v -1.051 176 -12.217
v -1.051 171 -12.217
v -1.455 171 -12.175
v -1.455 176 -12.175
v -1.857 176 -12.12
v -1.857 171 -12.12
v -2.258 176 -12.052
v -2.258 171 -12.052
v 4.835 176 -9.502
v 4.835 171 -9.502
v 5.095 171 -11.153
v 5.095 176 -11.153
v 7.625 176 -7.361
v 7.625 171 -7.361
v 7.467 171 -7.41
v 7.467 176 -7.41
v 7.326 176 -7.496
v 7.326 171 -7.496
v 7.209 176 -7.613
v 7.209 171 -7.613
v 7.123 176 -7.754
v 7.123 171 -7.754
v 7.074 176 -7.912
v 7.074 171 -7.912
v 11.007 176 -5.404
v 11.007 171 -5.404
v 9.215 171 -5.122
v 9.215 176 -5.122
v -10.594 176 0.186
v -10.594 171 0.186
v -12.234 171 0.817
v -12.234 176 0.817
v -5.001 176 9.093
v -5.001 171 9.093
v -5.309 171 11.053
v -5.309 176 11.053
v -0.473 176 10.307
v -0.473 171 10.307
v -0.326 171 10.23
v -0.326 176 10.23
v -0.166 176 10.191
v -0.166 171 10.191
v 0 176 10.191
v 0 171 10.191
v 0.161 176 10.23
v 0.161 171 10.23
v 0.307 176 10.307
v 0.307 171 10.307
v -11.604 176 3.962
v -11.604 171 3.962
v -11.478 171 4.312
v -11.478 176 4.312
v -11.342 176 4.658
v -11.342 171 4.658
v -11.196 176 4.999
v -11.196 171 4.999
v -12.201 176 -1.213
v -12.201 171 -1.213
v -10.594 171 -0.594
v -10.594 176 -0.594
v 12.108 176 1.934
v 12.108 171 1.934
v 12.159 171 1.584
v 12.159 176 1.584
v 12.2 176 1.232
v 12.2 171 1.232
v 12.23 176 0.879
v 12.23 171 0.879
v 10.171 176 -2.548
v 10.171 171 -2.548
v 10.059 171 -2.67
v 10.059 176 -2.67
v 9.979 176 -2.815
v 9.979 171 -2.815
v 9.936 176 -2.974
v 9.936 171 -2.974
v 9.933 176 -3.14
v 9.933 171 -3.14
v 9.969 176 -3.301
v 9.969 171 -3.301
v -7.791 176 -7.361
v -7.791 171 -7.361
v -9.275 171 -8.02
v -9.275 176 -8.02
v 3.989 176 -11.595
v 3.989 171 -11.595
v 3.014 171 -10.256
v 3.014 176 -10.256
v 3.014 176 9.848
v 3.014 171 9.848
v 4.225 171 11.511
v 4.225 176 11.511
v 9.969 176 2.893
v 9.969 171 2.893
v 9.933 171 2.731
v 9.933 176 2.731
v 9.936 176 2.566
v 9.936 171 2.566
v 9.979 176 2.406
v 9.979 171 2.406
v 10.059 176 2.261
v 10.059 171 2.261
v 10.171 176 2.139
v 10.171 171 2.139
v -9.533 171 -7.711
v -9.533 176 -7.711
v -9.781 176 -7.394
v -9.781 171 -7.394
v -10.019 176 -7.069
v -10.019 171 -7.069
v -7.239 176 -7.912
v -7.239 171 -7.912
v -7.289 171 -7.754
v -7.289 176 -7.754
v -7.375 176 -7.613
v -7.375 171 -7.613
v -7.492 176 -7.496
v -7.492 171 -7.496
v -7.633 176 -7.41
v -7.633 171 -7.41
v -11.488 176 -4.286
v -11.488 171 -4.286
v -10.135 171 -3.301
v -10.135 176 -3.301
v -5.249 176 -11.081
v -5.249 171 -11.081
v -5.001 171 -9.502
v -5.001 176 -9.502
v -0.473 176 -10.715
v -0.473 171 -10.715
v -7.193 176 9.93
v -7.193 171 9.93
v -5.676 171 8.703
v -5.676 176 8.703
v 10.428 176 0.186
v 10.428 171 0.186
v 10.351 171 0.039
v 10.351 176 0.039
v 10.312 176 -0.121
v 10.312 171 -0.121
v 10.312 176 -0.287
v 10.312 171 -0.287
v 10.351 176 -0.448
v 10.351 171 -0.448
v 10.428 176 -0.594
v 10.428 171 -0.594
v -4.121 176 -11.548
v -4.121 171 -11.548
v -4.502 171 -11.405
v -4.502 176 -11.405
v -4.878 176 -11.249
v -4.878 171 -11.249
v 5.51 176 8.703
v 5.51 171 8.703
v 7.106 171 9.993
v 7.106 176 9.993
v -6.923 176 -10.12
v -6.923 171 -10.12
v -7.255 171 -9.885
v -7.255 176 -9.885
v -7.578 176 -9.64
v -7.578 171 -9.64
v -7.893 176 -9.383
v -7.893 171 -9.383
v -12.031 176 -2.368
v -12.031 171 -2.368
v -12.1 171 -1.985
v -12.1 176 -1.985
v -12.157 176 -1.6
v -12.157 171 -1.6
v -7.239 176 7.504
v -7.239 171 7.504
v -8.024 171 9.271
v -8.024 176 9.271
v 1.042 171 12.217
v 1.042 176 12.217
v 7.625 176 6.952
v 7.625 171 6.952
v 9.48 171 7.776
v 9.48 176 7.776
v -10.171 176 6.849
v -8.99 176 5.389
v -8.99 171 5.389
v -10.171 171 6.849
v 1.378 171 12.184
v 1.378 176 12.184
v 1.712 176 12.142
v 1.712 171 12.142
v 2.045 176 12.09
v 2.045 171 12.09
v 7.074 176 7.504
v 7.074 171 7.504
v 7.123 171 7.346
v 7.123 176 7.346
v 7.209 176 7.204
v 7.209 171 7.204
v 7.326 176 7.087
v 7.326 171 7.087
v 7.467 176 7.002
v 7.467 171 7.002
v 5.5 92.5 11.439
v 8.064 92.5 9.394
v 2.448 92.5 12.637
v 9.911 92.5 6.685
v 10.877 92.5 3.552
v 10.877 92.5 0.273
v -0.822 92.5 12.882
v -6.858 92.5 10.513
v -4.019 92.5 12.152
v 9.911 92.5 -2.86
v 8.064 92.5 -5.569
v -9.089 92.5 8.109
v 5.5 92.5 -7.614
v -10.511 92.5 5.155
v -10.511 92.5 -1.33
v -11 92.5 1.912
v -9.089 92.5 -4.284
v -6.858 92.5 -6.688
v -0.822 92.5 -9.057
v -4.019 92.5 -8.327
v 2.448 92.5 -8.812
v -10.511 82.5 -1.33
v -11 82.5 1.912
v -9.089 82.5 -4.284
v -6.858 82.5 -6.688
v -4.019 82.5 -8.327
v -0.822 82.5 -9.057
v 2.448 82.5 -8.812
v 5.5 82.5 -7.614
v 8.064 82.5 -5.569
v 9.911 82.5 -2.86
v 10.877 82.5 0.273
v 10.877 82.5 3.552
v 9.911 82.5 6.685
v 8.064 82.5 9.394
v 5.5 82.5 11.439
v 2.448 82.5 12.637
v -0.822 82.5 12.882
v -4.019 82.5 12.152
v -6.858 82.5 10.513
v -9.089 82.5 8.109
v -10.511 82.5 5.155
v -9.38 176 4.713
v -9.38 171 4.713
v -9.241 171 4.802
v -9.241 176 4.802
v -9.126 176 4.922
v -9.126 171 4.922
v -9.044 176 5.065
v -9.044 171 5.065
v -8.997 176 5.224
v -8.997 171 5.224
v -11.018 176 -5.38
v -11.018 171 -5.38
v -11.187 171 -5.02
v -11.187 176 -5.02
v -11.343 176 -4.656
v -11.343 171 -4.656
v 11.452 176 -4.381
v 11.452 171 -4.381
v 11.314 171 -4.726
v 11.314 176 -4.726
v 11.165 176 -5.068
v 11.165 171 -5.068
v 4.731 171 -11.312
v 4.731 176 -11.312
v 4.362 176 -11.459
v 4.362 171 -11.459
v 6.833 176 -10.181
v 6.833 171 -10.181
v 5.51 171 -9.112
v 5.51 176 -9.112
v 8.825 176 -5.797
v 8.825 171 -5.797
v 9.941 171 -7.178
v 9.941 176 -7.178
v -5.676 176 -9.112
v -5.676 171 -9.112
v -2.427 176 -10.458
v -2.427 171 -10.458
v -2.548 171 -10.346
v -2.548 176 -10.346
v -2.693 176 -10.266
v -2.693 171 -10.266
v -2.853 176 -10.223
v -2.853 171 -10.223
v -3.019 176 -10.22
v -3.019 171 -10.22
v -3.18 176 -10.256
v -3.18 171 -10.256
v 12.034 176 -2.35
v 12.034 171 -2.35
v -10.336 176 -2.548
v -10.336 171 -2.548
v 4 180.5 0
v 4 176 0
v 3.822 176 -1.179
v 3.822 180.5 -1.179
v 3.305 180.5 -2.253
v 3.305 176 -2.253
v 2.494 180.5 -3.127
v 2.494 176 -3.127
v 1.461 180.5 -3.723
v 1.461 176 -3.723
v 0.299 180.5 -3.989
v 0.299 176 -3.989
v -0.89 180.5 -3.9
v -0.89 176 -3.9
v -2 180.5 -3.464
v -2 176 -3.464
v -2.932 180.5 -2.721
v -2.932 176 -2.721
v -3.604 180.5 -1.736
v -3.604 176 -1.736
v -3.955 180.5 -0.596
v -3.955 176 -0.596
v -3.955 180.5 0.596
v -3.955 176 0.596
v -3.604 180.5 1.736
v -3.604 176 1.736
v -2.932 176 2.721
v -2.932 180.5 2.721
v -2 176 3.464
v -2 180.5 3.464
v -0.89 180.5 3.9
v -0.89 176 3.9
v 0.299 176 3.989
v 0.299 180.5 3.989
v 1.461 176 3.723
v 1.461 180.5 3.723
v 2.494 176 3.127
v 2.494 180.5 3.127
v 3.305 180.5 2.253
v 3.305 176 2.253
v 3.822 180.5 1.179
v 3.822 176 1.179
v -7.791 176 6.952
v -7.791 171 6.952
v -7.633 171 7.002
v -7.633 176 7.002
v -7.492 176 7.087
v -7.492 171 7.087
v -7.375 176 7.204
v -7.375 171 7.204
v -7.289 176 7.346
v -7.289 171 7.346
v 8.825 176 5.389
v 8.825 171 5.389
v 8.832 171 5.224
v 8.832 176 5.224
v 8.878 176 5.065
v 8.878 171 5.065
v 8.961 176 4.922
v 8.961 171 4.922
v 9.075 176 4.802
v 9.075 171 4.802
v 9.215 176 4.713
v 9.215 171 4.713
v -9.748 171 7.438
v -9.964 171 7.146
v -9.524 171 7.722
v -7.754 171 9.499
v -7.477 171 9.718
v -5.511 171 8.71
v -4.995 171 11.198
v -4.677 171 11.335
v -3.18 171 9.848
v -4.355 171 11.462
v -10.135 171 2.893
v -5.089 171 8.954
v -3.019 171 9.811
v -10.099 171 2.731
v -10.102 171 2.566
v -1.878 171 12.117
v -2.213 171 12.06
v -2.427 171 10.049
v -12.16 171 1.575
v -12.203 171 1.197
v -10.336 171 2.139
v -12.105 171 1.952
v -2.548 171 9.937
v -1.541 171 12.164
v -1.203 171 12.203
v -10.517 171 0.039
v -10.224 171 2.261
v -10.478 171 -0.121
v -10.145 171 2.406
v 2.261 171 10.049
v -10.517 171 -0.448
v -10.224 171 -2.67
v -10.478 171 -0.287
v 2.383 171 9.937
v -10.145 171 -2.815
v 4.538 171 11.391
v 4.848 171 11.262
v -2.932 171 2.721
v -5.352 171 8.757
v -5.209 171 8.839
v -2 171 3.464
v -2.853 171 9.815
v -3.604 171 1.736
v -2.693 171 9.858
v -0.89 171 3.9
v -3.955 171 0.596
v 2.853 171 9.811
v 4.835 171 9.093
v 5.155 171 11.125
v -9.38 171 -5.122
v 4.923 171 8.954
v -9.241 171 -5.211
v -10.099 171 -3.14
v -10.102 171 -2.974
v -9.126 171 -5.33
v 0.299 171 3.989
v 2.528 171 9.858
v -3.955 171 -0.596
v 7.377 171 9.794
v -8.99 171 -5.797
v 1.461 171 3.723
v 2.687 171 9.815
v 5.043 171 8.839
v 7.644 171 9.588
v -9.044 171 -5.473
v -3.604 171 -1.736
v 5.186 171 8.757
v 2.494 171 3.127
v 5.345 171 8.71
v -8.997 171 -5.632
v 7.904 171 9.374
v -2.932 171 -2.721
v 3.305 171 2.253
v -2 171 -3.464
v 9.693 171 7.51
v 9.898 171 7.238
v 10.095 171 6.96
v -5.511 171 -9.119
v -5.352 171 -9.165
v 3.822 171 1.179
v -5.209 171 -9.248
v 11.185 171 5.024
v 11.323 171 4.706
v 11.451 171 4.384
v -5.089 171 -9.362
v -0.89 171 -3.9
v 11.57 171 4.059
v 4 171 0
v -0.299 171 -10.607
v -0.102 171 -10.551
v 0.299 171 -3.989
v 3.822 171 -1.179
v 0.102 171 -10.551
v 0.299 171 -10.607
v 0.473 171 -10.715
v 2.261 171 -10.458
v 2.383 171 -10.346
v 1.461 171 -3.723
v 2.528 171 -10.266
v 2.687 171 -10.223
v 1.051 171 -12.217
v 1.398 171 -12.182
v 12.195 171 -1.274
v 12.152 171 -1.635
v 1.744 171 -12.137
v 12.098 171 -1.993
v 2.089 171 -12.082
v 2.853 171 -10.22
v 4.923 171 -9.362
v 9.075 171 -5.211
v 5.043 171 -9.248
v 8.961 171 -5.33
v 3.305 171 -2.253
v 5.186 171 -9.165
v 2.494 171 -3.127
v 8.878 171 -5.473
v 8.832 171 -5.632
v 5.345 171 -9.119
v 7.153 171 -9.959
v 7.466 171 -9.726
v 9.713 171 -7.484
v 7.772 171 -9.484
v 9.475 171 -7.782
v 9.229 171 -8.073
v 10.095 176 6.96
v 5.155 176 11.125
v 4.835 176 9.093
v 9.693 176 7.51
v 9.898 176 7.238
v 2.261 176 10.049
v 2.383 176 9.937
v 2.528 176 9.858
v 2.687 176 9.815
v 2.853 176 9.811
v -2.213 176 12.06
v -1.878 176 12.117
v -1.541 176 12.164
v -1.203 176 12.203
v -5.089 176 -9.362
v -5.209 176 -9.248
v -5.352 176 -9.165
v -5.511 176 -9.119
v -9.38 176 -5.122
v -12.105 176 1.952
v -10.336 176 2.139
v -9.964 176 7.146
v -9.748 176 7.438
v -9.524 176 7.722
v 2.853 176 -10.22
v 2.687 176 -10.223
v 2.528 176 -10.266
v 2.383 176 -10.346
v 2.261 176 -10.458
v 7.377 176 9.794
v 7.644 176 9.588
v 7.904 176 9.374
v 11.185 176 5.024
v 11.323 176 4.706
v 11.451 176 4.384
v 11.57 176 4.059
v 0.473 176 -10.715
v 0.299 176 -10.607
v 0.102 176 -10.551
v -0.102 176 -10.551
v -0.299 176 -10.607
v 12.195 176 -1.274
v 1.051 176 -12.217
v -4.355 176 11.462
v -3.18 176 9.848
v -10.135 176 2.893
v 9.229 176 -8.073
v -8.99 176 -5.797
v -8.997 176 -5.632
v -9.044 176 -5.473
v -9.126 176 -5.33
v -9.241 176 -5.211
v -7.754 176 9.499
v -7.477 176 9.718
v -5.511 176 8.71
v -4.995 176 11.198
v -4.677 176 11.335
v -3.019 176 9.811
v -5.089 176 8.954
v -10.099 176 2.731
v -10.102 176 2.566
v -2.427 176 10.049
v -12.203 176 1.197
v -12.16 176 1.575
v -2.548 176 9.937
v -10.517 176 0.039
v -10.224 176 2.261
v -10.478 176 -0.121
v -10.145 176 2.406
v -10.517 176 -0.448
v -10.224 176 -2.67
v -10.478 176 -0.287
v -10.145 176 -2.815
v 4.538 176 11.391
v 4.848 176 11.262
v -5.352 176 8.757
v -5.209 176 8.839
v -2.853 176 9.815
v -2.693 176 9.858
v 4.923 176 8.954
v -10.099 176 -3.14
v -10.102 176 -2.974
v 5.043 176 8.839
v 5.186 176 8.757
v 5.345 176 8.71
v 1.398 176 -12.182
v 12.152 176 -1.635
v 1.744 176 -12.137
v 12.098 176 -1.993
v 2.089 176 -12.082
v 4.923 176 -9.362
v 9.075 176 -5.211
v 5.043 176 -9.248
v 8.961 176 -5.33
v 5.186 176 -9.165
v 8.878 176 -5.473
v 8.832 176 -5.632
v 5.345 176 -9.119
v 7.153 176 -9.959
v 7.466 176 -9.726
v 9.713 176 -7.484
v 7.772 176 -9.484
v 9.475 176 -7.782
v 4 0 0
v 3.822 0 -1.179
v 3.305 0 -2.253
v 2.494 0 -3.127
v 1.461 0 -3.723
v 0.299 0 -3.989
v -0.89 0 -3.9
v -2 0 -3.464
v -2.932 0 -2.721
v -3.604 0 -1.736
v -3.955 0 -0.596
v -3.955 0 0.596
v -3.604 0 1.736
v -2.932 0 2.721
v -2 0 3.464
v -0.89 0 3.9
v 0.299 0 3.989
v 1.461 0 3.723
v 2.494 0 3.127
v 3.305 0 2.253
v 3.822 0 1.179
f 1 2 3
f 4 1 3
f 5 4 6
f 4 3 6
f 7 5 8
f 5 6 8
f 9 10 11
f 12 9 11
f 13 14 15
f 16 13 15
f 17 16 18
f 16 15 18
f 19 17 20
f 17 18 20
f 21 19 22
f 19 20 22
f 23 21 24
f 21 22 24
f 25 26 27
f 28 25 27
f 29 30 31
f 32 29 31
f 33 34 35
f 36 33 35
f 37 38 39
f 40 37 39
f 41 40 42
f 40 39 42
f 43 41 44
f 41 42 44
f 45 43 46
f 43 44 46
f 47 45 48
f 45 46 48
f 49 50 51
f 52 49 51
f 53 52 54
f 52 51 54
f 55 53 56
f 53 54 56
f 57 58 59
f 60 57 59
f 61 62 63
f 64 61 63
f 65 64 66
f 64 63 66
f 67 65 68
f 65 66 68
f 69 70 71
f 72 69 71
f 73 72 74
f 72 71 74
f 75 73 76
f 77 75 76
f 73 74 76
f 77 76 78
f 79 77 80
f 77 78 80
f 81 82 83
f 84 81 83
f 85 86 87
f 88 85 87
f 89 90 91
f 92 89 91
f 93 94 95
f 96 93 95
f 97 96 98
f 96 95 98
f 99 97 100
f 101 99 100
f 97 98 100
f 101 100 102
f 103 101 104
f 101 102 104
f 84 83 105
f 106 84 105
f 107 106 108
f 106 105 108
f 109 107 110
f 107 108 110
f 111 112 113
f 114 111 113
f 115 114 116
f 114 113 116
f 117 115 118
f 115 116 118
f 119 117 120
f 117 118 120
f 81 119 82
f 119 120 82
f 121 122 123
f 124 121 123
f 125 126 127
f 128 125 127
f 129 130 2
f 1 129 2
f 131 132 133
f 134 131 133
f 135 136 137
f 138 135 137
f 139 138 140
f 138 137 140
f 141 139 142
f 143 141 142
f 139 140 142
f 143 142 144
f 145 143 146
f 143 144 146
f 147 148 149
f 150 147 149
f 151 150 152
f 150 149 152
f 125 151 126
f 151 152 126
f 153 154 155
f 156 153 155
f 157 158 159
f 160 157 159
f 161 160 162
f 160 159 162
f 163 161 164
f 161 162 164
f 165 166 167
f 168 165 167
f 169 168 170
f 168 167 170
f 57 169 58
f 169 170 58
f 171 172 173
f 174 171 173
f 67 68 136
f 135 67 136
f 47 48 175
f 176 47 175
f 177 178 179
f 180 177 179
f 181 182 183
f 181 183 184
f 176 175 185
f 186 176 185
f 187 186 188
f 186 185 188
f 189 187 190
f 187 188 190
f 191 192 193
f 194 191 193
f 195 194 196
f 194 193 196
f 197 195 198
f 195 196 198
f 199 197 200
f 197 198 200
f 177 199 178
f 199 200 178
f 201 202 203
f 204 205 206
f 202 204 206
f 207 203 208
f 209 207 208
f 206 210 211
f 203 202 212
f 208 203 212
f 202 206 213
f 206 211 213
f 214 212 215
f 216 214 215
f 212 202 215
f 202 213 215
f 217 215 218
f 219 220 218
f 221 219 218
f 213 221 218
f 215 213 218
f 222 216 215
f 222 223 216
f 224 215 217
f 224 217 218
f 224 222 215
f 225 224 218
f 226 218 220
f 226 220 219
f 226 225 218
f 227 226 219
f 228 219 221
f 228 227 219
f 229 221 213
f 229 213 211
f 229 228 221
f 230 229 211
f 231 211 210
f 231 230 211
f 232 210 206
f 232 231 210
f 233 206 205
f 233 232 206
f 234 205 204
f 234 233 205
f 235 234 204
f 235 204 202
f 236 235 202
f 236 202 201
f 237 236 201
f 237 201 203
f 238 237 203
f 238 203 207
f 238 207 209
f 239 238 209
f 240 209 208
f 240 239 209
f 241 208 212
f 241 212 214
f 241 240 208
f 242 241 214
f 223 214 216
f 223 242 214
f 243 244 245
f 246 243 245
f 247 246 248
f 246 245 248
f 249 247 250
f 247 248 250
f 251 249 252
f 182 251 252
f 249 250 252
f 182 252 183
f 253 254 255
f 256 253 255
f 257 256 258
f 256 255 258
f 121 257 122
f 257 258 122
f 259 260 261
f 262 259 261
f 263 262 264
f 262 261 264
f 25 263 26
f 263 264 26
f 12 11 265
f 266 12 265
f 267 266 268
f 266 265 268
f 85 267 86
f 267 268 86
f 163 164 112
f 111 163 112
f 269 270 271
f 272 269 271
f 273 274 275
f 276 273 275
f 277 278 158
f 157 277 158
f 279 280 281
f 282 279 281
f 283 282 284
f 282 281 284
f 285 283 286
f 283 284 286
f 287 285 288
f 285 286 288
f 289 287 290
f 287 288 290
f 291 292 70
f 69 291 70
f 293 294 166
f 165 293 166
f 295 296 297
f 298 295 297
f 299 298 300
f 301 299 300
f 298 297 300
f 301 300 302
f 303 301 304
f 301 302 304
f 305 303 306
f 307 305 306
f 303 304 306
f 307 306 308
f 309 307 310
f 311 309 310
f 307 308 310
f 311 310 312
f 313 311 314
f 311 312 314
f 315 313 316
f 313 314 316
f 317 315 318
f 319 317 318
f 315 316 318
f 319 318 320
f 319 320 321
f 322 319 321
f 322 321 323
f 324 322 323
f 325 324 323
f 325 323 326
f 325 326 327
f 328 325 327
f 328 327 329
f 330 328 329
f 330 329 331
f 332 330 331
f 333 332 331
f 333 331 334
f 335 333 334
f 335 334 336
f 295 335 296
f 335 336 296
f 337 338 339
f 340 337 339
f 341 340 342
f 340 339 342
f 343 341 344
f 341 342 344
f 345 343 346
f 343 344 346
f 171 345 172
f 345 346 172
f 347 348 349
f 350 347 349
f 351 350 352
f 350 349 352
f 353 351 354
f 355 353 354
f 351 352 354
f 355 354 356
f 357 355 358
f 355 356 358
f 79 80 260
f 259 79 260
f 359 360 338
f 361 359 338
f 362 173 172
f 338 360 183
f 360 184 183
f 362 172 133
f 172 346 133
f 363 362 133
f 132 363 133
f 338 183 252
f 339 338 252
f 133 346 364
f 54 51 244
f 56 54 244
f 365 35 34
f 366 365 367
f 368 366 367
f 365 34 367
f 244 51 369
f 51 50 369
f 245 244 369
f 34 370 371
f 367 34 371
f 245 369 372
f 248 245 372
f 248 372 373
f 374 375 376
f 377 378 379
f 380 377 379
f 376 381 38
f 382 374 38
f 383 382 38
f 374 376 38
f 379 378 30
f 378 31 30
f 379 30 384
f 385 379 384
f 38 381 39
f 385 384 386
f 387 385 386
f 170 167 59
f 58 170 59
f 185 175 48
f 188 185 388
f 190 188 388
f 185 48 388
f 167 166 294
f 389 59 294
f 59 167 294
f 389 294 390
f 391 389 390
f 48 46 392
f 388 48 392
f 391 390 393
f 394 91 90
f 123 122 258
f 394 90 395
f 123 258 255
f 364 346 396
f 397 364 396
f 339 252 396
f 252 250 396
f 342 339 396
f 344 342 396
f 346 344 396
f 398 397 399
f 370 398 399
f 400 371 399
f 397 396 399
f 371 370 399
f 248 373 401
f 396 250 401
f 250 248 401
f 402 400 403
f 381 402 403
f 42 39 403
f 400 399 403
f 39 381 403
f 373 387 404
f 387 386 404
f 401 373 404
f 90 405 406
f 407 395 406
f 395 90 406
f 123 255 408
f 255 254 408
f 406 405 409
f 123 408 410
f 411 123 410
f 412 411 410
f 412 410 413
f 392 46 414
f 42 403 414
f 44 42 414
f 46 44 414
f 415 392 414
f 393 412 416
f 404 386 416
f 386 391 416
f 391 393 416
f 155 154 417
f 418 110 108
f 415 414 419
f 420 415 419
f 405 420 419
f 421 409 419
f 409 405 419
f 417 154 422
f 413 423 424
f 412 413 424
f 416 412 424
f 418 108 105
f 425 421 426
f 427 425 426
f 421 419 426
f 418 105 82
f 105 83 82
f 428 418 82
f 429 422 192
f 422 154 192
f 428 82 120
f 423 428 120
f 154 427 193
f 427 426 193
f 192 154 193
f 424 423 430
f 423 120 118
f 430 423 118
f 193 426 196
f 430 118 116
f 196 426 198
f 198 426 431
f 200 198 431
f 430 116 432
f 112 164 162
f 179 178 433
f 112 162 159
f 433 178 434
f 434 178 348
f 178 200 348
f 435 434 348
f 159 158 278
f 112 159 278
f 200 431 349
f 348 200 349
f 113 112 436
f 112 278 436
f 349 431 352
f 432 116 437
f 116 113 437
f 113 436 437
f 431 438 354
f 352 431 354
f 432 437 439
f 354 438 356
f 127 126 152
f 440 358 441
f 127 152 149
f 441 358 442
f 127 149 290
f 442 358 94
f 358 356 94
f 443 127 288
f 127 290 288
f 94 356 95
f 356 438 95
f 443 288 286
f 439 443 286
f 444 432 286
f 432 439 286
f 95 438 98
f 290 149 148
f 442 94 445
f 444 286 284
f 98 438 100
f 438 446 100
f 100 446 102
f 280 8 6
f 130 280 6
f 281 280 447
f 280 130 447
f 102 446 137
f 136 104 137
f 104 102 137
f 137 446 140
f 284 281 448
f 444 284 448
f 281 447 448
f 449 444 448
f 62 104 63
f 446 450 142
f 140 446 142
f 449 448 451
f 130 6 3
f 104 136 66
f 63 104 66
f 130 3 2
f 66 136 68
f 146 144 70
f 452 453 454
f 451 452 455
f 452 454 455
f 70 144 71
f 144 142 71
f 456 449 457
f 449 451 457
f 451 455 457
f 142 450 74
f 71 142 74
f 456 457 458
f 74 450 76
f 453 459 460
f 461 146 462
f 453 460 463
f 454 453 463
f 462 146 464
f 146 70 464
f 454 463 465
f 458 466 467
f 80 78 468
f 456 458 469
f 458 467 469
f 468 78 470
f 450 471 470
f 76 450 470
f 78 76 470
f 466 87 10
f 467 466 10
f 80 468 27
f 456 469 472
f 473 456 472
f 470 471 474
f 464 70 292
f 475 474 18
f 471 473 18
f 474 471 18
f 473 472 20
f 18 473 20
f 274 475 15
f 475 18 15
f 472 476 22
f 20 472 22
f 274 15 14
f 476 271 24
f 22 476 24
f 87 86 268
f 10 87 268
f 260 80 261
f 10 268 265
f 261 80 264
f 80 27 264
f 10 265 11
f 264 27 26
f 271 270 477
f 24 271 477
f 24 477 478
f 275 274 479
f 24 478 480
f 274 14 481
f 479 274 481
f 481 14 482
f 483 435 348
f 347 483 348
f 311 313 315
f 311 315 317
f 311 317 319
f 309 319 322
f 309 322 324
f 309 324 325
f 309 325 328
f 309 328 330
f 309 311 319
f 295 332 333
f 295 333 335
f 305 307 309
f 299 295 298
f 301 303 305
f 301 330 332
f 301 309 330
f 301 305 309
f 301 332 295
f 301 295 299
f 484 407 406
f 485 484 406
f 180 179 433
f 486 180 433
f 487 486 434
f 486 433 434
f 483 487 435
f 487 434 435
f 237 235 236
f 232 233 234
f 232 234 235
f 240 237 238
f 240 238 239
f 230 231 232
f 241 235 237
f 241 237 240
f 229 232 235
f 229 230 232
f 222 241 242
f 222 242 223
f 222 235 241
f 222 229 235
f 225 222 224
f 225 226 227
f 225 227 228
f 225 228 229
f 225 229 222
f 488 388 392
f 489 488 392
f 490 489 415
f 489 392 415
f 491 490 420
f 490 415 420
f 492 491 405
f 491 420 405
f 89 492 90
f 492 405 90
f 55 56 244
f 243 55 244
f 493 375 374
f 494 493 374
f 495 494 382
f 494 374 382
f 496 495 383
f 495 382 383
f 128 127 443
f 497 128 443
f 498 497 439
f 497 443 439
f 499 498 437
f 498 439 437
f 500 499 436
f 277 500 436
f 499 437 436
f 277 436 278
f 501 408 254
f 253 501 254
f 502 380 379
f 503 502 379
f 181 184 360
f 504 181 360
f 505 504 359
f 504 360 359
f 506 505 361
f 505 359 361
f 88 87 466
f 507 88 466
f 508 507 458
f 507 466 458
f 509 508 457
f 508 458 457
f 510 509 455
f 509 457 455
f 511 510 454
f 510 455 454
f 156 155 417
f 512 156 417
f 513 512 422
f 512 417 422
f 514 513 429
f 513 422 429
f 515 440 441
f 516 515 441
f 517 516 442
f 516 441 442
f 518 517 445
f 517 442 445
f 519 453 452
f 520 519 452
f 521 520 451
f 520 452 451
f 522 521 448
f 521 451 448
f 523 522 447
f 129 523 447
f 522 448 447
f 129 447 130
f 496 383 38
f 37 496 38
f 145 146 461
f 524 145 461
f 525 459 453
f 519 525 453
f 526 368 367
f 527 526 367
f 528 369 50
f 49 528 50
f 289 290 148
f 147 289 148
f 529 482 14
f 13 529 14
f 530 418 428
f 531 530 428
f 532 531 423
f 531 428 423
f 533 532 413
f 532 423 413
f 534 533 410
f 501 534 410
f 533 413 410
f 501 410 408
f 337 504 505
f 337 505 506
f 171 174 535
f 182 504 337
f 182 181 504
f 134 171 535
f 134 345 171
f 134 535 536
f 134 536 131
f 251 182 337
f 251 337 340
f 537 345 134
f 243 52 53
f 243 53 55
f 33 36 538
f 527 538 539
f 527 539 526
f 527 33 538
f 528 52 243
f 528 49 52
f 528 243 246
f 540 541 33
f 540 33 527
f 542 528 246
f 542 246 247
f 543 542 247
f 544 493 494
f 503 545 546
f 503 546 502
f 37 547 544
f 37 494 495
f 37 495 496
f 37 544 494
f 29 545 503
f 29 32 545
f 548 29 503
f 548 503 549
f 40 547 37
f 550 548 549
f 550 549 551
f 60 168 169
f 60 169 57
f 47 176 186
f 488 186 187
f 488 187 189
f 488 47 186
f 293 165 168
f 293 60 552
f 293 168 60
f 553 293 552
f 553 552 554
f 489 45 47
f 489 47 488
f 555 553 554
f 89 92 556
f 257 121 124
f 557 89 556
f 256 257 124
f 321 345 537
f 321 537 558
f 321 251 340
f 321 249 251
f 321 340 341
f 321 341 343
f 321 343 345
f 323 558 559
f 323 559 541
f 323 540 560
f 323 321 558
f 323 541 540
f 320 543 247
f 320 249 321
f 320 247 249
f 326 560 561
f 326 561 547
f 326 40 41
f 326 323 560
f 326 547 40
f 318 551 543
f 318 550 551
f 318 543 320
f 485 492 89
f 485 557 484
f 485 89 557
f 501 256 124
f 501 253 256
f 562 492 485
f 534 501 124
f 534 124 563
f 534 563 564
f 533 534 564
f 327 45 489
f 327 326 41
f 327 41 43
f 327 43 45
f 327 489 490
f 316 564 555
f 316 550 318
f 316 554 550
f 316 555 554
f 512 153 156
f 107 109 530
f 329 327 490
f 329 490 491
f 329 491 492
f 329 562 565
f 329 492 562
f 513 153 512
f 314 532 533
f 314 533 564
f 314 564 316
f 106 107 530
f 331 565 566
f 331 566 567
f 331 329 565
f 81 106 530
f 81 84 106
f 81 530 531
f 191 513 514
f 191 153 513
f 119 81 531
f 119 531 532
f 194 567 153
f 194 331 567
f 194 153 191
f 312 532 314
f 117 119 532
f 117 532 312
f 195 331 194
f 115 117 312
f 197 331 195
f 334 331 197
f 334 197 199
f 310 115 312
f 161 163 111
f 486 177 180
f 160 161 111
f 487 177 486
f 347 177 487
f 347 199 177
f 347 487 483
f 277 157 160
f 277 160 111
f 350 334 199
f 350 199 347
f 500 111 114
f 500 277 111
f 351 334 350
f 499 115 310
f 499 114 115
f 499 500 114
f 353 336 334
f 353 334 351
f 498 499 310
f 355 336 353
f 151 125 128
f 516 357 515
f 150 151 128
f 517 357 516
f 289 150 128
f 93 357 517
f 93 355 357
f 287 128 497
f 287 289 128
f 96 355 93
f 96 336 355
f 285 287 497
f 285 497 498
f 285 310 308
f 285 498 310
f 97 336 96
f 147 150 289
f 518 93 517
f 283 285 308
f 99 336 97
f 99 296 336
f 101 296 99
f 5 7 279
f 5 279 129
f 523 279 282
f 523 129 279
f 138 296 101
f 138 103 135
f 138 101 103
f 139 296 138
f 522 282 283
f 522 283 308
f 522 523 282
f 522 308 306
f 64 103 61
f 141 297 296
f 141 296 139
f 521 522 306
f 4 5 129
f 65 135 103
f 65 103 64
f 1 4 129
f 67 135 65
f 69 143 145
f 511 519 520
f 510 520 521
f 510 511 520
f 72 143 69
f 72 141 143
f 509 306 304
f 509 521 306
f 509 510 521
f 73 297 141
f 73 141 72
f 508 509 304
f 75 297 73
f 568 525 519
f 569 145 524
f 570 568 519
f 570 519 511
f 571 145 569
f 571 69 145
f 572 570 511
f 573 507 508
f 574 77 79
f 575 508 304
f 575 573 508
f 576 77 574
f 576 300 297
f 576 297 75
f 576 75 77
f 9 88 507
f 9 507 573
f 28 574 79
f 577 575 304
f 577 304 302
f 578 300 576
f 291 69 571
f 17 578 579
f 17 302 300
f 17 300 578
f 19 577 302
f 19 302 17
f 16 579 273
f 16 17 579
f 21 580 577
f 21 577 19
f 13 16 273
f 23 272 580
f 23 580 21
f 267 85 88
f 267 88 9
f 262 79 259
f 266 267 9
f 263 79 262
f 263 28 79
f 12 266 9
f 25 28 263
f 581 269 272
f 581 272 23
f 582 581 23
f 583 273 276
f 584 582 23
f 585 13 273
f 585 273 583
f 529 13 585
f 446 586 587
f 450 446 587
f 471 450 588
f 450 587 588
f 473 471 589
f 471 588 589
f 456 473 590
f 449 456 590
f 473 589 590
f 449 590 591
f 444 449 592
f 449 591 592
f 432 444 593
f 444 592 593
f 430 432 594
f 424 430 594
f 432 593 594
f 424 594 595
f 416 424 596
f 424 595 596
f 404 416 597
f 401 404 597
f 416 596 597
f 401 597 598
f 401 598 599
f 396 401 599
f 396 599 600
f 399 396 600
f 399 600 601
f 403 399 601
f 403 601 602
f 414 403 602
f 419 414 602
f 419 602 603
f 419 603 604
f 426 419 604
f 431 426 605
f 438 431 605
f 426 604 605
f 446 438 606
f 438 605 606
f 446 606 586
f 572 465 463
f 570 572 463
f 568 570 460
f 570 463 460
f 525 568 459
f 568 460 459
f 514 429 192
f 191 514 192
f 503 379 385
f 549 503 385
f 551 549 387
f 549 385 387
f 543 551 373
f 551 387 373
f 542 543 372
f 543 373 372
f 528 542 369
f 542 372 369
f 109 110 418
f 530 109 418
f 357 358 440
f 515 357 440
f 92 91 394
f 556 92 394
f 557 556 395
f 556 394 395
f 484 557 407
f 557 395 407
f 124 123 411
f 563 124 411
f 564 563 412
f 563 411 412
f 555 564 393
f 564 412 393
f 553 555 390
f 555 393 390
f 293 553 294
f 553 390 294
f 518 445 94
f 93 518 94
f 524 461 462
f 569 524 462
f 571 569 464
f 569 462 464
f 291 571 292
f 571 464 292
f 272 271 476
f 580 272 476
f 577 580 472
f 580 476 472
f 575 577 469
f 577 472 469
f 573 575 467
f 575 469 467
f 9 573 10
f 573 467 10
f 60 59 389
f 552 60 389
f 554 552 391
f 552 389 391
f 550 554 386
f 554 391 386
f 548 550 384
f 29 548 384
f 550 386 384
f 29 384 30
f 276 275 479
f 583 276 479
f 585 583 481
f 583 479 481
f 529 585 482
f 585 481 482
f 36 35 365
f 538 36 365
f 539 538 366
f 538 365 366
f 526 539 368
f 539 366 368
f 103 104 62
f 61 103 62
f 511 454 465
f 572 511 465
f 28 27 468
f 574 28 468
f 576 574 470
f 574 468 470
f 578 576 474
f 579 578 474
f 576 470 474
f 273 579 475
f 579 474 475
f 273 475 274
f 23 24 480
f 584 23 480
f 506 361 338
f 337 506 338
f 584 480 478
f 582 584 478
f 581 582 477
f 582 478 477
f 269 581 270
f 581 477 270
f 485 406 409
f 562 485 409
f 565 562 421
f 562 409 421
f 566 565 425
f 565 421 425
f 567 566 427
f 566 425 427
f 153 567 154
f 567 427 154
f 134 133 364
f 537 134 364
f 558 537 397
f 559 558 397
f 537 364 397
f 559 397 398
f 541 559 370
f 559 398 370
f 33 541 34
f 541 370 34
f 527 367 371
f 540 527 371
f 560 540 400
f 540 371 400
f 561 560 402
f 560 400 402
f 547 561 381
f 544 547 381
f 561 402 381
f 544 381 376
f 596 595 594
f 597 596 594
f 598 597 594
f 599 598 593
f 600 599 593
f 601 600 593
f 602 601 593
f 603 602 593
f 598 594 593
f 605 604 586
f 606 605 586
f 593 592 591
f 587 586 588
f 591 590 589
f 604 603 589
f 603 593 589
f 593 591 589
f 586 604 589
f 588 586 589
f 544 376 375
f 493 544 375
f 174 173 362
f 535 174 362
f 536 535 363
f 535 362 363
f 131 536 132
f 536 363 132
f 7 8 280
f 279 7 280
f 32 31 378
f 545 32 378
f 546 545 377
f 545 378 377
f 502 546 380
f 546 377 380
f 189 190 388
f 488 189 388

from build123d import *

# Parameters (mm, degrees)
CROQUIS1_R                   = 4
SALIENTE_EXTRUIR1_DEPTH      = 171
SALIENTE_EXTRUIR3_DEPTH      = 5
CROQUIS4_R                   = 4
SALIENTE_EXTRUIR4_DEPTH      = 4.5
CROQUIS5_R                   = 11
SALIENTE_EXTRUIR5_DEPTH      = 3
SALIENTE_EXTRUIR5_DEPTH_BACK = 7


with BuildPart() as part:
    # Croquis1 → Saliente-Extruir1 (new body)
    with BuildSketch(Plane(origin=(0, 0, 0), x_dir=(1, 0, 0), z_dir=(0, 1, 0))):
        Circle(CROQUIS1_R)
    extrude(amount=SALIENTE_EXTRUIR1_DEPTH)

    # Croquis3 → Saliente-Extruir3 (add)
    with BuildSketch(Plane(origin=(0, 171, 0), x_dir=(1, 0, 0), z_dir=(0, 1, 0))):
        with BuildLine():
            Line((1.050742858, 12.216507919), (0.472845286, 10.71499343))
            ThreePointArc((0.472845286, 10.71499343), (0, 10.543875222), (-0.472845286, 10.71499343))
            Line((-0.472845286, 10.71499343), (-1.050742858, 12.216507919))
            ThreePointArc((-1.050742858, 12.216507919), (-1.656207782, 12.14924286), (-2.257584572, 12.051988972))
            Line((-2.257584572, 12.051988972), (-2.426564451, 10.457781423))
            ThreePointArc((-2.426564451, 10.457781423), (-2.771930057, 10.239934406), (-3.179948954, 10.255912654))
            Line((-3.179948954, 10.255912654), (-4.120766374, 11.54843759))
            ThreePointArc((-4.120766374, 11.54843759), (-4.690827714, 11.328868507), (-5.249245828, 11.081179745))
            Line((-5.249245828, 11.081179745), (-5.000525386, 9.501805204))
            ThreePointArc((-5.000525386, 9.501805204), (-5.277739988, 9.201993948), (-5.675991453, 9.111824689))
            Line((-5.675991453, 9.111824689), (-6.923284582, 10.120042336))
            ThreePointArc((-6.923284582, 10.120042336), (-7.417219229, 9.763809974), (-7.892857245, 9.383492462))
            Line((-7.892857245, 9.383492462), (-7.239355878, 7.912212973))
            ThreePointArc((-7.239355878, 7.912212973), (-7.429527758, 7.55086912), (-7.790871612, 7.360697239))
            Line((-7.790871612, 7.360697239), (-9.275101788, 8.019950942))
            ThreePointArc((-9.275101788, 8.019950942), (-9.658562641, 7.553760256), (-10.018615343, 7.069262543))
            Line((-10.018615343, 7.069262543), (-8.990483327, 5.797332815))
            ThreePointArc((-8.990483327, 5.797332815), (-9.080652586, 5.39908135), (-9.380463842, 5.121866748))
            Line((-9.380463842, 5.121866748), (-11.018384727, 5.379807088))
            ThreePointArc((-11.018384727, 5.379807088), (-11.266454067, 4.838815873), (-11.487980236, 4.286424664))
            Line((-11.487980236, 4.286424664), (-10.134571292, 3.301290316))
            ThreePointArc((-10.134571292, 3.301290316), (-10.118593045, 2.893271419), (-10.336440061, 2.547905812))
            Line((-10.336440061, 2.547905812), (-12.0307187, 2.368318783))
            ThreePointArc((-12.0307187, 2.368318783), (-12.129855039, 1.792691558), (-12.201465745, 1.212996274))
            Line((-12.201465745, 1.212996274), (-10.593652069, 0.594186647))
            ThreePointArc((-10.593652069, 0.594186647), (-10.472615206, 0.204206132), (-10.593652069, -0.185774383))
            Line((-10.593652069, -0.185774383), (-12.234346993, -0.817239228))
            ThreePointArc((-12.234346993, -0.817239228), (-12.183011813, -1.386127504), (-12.105238209, -1.952007737))
            Line((-12.105238209, -1.952007737), (-10.336440061, -2.139493548))
            ThreePointArc((-10.336440061, -2.139493548), (-10.118593045, -2.484859155), (-10.134571292, -2.892878051))
            Line((-10.134571292, -2.892878051), (-11.603765461, -3.962291436))
            ThreePointArc((-11.603765461, -3.962291436), (-11.411733847, -4.485471759), (-11.196127365, -4.999385795))
            Line((-11.196127365, -4.999385795), (-9.380463842, -4.713454484))
            ThreePointArc((-9.380463842, -4.713454484), (-9.080652586, -4.990669086), (-8.990483327, -5.388920551))
            Line((-8.990483327, -5.388920551), (-10.170571543, -6.848839375))
            ThreePointArc((-10.170571543, -6.848839375), (-9.857154436, -7.29271093), (-9.524379813, -7.722261033))
            Line((-9.524379813, -7.722261033), (-7.790871612, -6.952284975))
            ThreePointArc((-7.790871612, -6.952284975), (-7.429527758, -7.142456856), (-7.239355878, -7.503800709))
            Line((-7.239355878, -7.503800709), (-8.024406446, -9.271247353))
            ThreePointArc((-8.024406446, -9.271247353), (-7.61599094, -9.60956858), (-7.193327687, -9.929912542))
            Line((-7.193327687, -9.929912542), (-5.675991453, -8.703412424))
            ThreePointArc((-5.675991453, -8.703412424), (-5.277739988, -8.793581684), (-5.000525386, -9.09339294))
            Line((-5.000525386, -9.09339294), (-5.309068741, -11.052642915))
            ThreePointArc((-5.309068741, -11.052642915), (-4.836465093, -11.26746341), (-4.355191926, -11.462086615))
            Line((-4.355191926, -11.462086615), (-3.179948954, -9.84750039))
            ThreePointArc((-3.179948954, -9.84750039), (-2.771930057, -9.831522142), (-2.426564451, -10.049369159))
            Line((-2.426564451, -10.049369159), (-2.213426541, -12.060176999))
            ThreePointArc((-2.213426541, -12.060176999), (-1.70946512, -12.141863749), (-1.202540078, -12.202500713))
            Line((-1.202540078, -12.202500713), (-0.472845286, -10.306581166))
            ThreePointArc((-0.472845286, -10.306581166), (-0.08286477, -10.185544303), (0.307115745, -10.306581166))
            Line((0.307115745, -10.306581166), (1.042474215, -12.217216287))
            ThreePointArc((1.042474215, -12.217216287), (1.544818551, -12.163908169), (2.04454079, -12.08995365))
            Line((2.04454079, -12.08995365), (2.26083491, -10.049369159))
            ThreePointArc((2.26083491, -10.049369159), (2.606200516, -9.831522142), (3.014219413, -9.84750039))
            Line((3.014219413, -9.84750039), (4.224886916, -11.510753965))
            ThreePointArc((4.224886916, -11.510753965), (4.693799885, -11.327637394), (5.154801423, -11.125428018))
            Line((5.154801423, -11.125428018), (4.834795845, -9.09339294))
            ThreePointArc((4.834795845, -9.09339294), (5.112010447, -8.793581684), (5.510261912, -8.703412424))
            Line((5.510261912, -8.703412424), (7.105542644, -9.992916993))
            ThreePointArc((7.105542644, -9.992916993), (7.511283882, -9.691632511), (7.90426552, -9.37388462))
            Line((7.90426552, -9.37388462), (7.073626337, -7.503800709))
            ThreePointArc((7.073626337, -7.503800709), (7.263798217, -7.142456856), (7.625142071, -6.952284975))
            Line((7.625142071, -6.952284975), (9.480310931, -7.776299309))
            ThreePointArc((9.480310931, -7.776299309), (9.796043302, -7.374595712), (10.094766478, -6.960087359))
            Line((10.094766478, -6.960087359), (8.824753786, -5.388920551))
            ThreePointArc((8.824753786, -5.388920551), (8.914923046, -4.990669086), (9.214734302, -4.713454484))
            Line((9.214734302, -4.713454484), (11.185209251, -5.023765551))
            ThreePointArc((11.185209251, -5.023765551), (11.388040568, -4.545289685), (11.570414703, -4.058648777))
            Line((11.570414703, -4.058648777), (9.968841751, -2.892878051))
            ThreePointArc((9.968841751, -2.892878051), (9.952863504, -2.484859155), (10.17071052, -2.139493548))
            Line((10.17071052, -2.139493548), (12.108106386, -1.934137026))
            ThreePointArc((12.108106386, -1.934137026), (12.180495026, -1.408072161), (12.230038474, -0.879366378))
            Line((12.230038474, -0.879366378), (10.427922528, -0.185774383))
            ThreePointArc((10.427922528, -0.185774383), (10.306885665, 0.204206132), (10.427922528, 0.594186647))
            Line((10.427922528, 0.594186647), (12.195208041, 1.274373229))
            ThreePointArc((12.195208041, 1.274373229), (12.12666239, 1.8141625), (12.034236318, 2.350379234))
            Line((12.034236318, 2.350379234), (10.17071052, 2.547905812))
            ThreePointArc((10.17071052, 2.547905812), (9.952863504, 2.893271419), (9.968841751, 3.301290316))
            Line((9.968841751, 3.301290316), (11.452232826, 4.381037502))
            ThreePointArc((11.452232826, 4.381037502), (11.241020253, 4.897610638), (11.006520824, 5.404037901))
            Line((11.006520824, 5.404037901), (9.214734302, 5.121866748))
            ThreePointArc((9.214734302, 5.121866748), (8.914923046, 5.39908135), (8.824753786, 5.797332815))
            Line((8.824753786, 5.797332815), (9.940895623, 7.178141856))
            ThreePointArc((9.940895623, 7.178141856), (9.595346713, 7.633901214), (9.228920544, 8.073050965))
            Line((9.228920544, 8.073050965), (7.625142071, 7.360697239))
            ThreePointArc((7.625142071, 7.360697239), (7.263798217, 7.55086912), (7.073626337, 7.912212973))
            Line((7.073626337, 7.912212973), (7.77177818, 9.48401762))
            ThreePointArc((7.77177818, 9.48401762), (7.310768329, 9.843769234), (6.83313078, 10.181132061))
            Line((6.83313078, 10.181132061), (5.510261912, 9.111824689))
            ThreePointArc((5.510261912, 9.111824689), (5.112010447, 9.201993948), (4.834795845, 9.501805204))
            Line((4.834795845, 9.501805204), (5.094829592, 11.15301922))
            ThreePointArc((5.094829592, 11.15301922), (4.547139411, 11.387302116), (3.988716959, 11.594708419))
            Line((3.988716959, 11.594708419), (3.014219413, 10.255912654))
            ThreePointArc((3.014219413, 10.255912654), (2.606200516, 10.239934406), (2.26083491, 10.457781423))
            Line((2.26083491, 10.457781423), (2.088629995, 12.082414951))
            ThreePointArc((2.088629995, 12.082414951), (1.571117662, 12.16053928), (1.050742858, 12.216507919))
        make_face()
    extrude(amount=SALIENTE_EXTRUIR3_DEPTH)

    # Croquis4 → Saliente-Extruir4 (add)
    with BuildSketch(Plane(origin=(0, 176, 0), x_dir=(1, 0, 0), z_dir=(0, 1, 0))):
        Circle(CROQUIS4_R)
    extrude(amount=SALIENTE_EXTRUIR4_DEPTH)


with BuildPart() as body_2:
    # Croquis5 → Saliente-Extruir5 (new body, two sides)
    with BuildSketch(Plane(origin=(0, 85.5, 0), x_dir=(-1, 0, 0), z_dir=(0, -1, 0))) as saliente_extruir5_sk:
        with Locations((0, -1.912427421)):
            Circle(CROQUIS5_R)
    extrude(amount=SALIENTE_EXTRUIR5_DEPTH)
    extrude(saliente_extruir5_sk.sketch, amount=-SALIENTE_EXTRUIR5_DEPTH_BACK)


solid = Compound([part.part, body_2.part])
